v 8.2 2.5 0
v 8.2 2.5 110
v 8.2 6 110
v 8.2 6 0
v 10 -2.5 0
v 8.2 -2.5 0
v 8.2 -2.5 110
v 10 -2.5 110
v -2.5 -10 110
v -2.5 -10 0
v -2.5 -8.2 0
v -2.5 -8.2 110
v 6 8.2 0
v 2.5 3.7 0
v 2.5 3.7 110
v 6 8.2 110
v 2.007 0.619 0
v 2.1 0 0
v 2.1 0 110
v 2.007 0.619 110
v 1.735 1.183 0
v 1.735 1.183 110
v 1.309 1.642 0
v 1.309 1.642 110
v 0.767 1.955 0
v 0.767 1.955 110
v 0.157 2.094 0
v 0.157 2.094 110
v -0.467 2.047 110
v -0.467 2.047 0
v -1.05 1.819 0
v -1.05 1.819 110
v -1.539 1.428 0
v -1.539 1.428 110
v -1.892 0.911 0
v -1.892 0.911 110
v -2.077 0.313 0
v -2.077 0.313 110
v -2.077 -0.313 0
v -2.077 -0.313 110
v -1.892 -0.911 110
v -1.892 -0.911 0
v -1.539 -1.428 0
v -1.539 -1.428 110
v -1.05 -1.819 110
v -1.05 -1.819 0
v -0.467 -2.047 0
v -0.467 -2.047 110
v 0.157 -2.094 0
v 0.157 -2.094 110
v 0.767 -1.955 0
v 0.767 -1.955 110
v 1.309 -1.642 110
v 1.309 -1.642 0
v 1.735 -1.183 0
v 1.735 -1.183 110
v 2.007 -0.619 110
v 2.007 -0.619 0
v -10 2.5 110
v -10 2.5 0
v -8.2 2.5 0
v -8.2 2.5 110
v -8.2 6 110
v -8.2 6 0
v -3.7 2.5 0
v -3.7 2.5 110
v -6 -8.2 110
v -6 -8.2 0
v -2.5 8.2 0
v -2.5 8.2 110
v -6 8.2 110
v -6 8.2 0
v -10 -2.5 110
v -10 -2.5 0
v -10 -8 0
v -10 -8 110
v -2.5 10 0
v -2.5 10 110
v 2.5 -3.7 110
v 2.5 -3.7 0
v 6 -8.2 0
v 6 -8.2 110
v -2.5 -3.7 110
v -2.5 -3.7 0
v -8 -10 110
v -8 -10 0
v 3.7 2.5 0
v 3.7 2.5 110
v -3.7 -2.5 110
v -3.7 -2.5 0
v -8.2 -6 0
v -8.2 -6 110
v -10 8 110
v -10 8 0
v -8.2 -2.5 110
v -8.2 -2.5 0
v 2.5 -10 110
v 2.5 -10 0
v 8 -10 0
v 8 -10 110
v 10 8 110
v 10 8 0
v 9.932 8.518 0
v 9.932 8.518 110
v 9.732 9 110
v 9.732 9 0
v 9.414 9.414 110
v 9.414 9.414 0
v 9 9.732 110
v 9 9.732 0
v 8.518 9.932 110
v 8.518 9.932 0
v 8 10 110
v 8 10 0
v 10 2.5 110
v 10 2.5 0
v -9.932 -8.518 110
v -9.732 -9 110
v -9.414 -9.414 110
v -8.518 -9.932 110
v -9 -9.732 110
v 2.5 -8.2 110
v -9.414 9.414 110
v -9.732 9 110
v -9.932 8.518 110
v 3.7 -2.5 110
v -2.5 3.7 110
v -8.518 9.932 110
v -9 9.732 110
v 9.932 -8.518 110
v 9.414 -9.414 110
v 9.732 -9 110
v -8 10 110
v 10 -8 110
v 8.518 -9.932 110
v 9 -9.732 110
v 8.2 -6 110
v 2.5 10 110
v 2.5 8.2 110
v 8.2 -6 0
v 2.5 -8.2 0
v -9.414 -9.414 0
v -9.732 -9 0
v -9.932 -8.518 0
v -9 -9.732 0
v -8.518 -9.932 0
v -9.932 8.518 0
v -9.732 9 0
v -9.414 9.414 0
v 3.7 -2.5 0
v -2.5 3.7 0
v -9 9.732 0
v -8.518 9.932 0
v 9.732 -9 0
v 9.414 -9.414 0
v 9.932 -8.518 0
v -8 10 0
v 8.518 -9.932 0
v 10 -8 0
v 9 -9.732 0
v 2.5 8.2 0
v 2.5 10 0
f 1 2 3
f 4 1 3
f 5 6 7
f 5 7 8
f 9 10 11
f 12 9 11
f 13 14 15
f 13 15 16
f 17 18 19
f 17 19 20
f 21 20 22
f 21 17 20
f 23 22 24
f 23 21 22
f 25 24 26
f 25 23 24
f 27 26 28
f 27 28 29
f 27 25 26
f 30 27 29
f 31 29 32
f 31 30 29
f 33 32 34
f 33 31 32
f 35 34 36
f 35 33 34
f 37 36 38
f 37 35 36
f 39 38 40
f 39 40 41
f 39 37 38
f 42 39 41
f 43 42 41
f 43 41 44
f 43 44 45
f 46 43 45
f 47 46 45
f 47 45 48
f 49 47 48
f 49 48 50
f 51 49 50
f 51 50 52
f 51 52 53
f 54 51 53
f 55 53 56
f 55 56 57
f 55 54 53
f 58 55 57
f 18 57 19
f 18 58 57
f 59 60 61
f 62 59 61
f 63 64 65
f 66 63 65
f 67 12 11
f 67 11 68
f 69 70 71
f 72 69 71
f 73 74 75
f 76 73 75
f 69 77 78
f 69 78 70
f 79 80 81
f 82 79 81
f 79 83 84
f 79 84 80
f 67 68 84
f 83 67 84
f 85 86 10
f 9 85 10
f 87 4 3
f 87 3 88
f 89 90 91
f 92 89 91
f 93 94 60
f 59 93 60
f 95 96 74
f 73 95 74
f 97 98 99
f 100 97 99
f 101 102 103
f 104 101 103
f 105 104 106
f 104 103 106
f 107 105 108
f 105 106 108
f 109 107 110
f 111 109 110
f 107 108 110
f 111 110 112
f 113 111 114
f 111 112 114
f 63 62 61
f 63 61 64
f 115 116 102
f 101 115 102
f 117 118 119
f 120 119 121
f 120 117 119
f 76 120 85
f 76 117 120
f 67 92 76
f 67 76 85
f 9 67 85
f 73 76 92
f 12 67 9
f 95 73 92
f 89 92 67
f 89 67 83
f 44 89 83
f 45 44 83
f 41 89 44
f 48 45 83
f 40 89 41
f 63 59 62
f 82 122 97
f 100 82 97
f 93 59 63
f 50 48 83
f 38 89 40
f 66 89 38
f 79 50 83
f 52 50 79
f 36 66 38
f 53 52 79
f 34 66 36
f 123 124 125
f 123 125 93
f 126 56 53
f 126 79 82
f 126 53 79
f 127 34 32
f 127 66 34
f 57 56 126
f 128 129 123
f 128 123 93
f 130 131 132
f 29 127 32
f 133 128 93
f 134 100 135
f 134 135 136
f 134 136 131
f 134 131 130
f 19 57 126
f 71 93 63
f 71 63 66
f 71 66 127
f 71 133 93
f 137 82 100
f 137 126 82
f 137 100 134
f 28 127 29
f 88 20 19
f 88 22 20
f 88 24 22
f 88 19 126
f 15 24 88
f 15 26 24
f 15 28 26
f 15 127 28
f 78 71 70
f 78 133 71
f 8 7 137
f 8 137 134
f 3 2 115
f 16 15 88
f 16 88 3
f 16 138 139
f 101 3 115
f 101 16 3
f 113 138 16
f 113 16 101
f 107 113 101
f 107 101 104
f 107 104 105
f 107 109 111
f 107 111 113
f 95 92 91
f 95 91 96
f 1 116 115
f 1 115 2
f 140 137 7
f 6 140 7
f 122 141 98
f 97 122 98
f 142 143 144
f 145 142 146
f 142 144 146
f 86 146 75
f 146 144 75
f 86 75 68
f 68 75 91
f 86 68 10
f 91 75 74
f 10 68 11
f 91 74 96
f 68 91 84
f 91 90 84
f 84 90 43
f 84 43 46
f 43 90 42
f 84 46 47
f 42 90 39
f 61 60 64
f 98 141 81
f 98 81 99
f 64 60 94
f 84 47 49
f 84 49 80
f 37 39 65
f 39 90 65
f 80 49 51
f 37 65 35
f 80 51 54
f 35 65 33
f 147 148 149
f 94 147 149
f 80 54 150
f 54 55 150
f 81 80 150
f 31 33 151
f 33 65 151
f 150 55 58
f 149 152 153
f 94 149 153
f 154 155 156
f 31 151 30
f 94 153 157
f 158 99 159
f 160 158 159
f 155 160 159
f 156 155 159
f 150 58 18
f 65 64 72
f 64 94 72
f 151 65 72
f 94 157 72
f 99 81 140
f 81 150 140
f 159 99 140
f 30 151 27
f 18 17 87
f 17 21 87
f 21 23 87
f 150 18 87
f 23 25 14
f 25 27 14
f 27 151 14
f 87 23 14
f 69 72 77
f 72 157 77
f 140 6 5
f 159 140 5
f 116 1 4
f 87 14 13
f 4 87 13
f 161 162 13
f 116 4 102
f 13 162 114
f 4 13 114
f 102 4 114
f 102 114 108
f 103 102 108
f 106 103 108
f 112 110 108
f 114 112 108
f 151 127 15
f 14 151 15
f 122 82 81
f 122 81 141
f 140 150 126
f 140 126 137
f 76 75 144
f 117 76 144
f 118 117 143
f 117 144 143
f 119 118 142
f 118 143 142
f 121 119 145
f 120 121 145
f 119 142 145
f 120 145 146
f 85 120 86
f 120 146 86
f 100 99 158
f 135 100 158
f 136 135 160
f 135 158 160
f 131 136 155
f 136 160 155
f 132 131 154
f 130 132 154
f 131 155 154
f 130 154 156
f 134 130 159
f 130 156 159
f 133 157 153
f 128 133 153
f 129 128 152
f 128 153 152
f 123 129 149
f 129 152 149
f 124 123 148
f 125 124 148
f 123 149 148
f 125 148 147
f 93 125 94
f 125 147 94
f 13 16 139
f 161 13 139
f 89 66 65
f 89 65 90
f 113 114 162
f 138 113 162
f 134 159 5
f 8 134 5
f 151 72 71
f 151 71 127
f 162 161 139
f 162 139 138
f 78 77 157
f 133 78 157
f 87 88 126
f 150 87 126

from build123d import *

# Parameters (mm, degrees)
EXTRUSION1_DEPTH        = 110
PER_AGE1_OUTLINE_R      = 2.1
PER_AGE1_DEPTH          = 110
ENL_V_MAT_EXTRU_1_DEPTH = 300
ENL_V_MAT_EXTRU_3_DEPTH = 300
ENL_V_MAT_EXTRU_4_DEPTH = 111.905365064
ENL_V_MAT_EXTRU_7_DEPTH = 111.905365064


# Read off the part's stored shape, not the designer's step: Perçage1
with BuildPart() as part:
    # Esquisse1 → Extrusion1 (new body)
    with BuildSketch(Plane.XY):
        with BuildLine():
            Line((-10, 8), (-10, -8))
            ThreePointArc((-10, -8), (-9.414213562, -9.414213562), (-8, -10))
            Line((-8, -10), (8, -10))
            ThreePointArc((8, -10), (9.414213562, -9.414213562), (10, -8))
            Line((10, -8), (10, 8))
            ThreePointArc((10, 8), (9.414213562, 9.414213562), (8, 10))
            Line((8, 10), (-8, 10))
            ThreePointArc((-8, 10), (-9.414213562, 9.414213562), (-10, 8))
        make_face()
    extrude(amount=EXTRUSION1_DEPTH)

    # Perçage1 outline → Perçage1 (cut)
    with BuildSketch(Plane.XY):
        Circle(PER_AGE1_OUTLINE_R)
    extrude(amount=PER_AGE1_DEPTH, mode=Mode.SUBTRACT)

    # Esquisse3 → Enlèv. mat.-Extru.1 (cut)
    with BuildSketch(Plane.XY.offset(110)):
        Polygon((10, 2.5), (8.2, 2.5), (8.2, 6), (3.7, 2.5), (3.7, -2.5), (8.2, -6), (8.2, -2.5), (10, -2.5), align=None)
    extrude(amount=-ENL_V_MAT_EXTRU_1_DEPTH, mode=Mode.SUBTRACT)

    # Esquisse5 → Enlèv. mat.-Extru.3 (cut)
    with BuildSketch(Plane.XY.offset(110)):
        Polygon((-2.5, 10), (-2.5, 8.2), (-6, 8.2), (-2.5, 3.7), (2.5, 3.7), (6, 8.2), (2.5, 8.2), (2.5, 10), align=None)
    extrude(amount=-ENL_V_MAT_EXTRU_3_DEPTH, mode=Mode.SUBTRACT)

    # Esquisse6 → Enlèv. mat.-Extru.4 (cut, through all)
    with BuildSketch(Plane.XY.offset(110)):
        Polygon((-2.5, -10), (-2.5, -8.2), (-6, -8.2), (-2.5, -3.7), (2.5, -3.7), (6, -8.2), (2.5, -8.2), (2.5, -10), align=None)
    extrude(amount=-ENL_V_MAT_EXTRU_4_DEPTH, mode=Mode.SUBTRACT)

    # Esquisse4 → Enlèv. mat.-Extru.7 (cut, through all)
    with BuildSketch(Plane.XY.offset(110)):
        Polygon((-10, 2.5), (-8.2, 2.5), (-8.2, 6), (-3.7, 2.5), (-3.7, -2.5), (-8.2, -6), (-8.2, -2.5), (-10, -2.5), align=None)
    extrude(amount=-ENL_V_MAT_EXTRU_7_DEPTH, mode=Mode.SUBTRACT)


solid = part.part
